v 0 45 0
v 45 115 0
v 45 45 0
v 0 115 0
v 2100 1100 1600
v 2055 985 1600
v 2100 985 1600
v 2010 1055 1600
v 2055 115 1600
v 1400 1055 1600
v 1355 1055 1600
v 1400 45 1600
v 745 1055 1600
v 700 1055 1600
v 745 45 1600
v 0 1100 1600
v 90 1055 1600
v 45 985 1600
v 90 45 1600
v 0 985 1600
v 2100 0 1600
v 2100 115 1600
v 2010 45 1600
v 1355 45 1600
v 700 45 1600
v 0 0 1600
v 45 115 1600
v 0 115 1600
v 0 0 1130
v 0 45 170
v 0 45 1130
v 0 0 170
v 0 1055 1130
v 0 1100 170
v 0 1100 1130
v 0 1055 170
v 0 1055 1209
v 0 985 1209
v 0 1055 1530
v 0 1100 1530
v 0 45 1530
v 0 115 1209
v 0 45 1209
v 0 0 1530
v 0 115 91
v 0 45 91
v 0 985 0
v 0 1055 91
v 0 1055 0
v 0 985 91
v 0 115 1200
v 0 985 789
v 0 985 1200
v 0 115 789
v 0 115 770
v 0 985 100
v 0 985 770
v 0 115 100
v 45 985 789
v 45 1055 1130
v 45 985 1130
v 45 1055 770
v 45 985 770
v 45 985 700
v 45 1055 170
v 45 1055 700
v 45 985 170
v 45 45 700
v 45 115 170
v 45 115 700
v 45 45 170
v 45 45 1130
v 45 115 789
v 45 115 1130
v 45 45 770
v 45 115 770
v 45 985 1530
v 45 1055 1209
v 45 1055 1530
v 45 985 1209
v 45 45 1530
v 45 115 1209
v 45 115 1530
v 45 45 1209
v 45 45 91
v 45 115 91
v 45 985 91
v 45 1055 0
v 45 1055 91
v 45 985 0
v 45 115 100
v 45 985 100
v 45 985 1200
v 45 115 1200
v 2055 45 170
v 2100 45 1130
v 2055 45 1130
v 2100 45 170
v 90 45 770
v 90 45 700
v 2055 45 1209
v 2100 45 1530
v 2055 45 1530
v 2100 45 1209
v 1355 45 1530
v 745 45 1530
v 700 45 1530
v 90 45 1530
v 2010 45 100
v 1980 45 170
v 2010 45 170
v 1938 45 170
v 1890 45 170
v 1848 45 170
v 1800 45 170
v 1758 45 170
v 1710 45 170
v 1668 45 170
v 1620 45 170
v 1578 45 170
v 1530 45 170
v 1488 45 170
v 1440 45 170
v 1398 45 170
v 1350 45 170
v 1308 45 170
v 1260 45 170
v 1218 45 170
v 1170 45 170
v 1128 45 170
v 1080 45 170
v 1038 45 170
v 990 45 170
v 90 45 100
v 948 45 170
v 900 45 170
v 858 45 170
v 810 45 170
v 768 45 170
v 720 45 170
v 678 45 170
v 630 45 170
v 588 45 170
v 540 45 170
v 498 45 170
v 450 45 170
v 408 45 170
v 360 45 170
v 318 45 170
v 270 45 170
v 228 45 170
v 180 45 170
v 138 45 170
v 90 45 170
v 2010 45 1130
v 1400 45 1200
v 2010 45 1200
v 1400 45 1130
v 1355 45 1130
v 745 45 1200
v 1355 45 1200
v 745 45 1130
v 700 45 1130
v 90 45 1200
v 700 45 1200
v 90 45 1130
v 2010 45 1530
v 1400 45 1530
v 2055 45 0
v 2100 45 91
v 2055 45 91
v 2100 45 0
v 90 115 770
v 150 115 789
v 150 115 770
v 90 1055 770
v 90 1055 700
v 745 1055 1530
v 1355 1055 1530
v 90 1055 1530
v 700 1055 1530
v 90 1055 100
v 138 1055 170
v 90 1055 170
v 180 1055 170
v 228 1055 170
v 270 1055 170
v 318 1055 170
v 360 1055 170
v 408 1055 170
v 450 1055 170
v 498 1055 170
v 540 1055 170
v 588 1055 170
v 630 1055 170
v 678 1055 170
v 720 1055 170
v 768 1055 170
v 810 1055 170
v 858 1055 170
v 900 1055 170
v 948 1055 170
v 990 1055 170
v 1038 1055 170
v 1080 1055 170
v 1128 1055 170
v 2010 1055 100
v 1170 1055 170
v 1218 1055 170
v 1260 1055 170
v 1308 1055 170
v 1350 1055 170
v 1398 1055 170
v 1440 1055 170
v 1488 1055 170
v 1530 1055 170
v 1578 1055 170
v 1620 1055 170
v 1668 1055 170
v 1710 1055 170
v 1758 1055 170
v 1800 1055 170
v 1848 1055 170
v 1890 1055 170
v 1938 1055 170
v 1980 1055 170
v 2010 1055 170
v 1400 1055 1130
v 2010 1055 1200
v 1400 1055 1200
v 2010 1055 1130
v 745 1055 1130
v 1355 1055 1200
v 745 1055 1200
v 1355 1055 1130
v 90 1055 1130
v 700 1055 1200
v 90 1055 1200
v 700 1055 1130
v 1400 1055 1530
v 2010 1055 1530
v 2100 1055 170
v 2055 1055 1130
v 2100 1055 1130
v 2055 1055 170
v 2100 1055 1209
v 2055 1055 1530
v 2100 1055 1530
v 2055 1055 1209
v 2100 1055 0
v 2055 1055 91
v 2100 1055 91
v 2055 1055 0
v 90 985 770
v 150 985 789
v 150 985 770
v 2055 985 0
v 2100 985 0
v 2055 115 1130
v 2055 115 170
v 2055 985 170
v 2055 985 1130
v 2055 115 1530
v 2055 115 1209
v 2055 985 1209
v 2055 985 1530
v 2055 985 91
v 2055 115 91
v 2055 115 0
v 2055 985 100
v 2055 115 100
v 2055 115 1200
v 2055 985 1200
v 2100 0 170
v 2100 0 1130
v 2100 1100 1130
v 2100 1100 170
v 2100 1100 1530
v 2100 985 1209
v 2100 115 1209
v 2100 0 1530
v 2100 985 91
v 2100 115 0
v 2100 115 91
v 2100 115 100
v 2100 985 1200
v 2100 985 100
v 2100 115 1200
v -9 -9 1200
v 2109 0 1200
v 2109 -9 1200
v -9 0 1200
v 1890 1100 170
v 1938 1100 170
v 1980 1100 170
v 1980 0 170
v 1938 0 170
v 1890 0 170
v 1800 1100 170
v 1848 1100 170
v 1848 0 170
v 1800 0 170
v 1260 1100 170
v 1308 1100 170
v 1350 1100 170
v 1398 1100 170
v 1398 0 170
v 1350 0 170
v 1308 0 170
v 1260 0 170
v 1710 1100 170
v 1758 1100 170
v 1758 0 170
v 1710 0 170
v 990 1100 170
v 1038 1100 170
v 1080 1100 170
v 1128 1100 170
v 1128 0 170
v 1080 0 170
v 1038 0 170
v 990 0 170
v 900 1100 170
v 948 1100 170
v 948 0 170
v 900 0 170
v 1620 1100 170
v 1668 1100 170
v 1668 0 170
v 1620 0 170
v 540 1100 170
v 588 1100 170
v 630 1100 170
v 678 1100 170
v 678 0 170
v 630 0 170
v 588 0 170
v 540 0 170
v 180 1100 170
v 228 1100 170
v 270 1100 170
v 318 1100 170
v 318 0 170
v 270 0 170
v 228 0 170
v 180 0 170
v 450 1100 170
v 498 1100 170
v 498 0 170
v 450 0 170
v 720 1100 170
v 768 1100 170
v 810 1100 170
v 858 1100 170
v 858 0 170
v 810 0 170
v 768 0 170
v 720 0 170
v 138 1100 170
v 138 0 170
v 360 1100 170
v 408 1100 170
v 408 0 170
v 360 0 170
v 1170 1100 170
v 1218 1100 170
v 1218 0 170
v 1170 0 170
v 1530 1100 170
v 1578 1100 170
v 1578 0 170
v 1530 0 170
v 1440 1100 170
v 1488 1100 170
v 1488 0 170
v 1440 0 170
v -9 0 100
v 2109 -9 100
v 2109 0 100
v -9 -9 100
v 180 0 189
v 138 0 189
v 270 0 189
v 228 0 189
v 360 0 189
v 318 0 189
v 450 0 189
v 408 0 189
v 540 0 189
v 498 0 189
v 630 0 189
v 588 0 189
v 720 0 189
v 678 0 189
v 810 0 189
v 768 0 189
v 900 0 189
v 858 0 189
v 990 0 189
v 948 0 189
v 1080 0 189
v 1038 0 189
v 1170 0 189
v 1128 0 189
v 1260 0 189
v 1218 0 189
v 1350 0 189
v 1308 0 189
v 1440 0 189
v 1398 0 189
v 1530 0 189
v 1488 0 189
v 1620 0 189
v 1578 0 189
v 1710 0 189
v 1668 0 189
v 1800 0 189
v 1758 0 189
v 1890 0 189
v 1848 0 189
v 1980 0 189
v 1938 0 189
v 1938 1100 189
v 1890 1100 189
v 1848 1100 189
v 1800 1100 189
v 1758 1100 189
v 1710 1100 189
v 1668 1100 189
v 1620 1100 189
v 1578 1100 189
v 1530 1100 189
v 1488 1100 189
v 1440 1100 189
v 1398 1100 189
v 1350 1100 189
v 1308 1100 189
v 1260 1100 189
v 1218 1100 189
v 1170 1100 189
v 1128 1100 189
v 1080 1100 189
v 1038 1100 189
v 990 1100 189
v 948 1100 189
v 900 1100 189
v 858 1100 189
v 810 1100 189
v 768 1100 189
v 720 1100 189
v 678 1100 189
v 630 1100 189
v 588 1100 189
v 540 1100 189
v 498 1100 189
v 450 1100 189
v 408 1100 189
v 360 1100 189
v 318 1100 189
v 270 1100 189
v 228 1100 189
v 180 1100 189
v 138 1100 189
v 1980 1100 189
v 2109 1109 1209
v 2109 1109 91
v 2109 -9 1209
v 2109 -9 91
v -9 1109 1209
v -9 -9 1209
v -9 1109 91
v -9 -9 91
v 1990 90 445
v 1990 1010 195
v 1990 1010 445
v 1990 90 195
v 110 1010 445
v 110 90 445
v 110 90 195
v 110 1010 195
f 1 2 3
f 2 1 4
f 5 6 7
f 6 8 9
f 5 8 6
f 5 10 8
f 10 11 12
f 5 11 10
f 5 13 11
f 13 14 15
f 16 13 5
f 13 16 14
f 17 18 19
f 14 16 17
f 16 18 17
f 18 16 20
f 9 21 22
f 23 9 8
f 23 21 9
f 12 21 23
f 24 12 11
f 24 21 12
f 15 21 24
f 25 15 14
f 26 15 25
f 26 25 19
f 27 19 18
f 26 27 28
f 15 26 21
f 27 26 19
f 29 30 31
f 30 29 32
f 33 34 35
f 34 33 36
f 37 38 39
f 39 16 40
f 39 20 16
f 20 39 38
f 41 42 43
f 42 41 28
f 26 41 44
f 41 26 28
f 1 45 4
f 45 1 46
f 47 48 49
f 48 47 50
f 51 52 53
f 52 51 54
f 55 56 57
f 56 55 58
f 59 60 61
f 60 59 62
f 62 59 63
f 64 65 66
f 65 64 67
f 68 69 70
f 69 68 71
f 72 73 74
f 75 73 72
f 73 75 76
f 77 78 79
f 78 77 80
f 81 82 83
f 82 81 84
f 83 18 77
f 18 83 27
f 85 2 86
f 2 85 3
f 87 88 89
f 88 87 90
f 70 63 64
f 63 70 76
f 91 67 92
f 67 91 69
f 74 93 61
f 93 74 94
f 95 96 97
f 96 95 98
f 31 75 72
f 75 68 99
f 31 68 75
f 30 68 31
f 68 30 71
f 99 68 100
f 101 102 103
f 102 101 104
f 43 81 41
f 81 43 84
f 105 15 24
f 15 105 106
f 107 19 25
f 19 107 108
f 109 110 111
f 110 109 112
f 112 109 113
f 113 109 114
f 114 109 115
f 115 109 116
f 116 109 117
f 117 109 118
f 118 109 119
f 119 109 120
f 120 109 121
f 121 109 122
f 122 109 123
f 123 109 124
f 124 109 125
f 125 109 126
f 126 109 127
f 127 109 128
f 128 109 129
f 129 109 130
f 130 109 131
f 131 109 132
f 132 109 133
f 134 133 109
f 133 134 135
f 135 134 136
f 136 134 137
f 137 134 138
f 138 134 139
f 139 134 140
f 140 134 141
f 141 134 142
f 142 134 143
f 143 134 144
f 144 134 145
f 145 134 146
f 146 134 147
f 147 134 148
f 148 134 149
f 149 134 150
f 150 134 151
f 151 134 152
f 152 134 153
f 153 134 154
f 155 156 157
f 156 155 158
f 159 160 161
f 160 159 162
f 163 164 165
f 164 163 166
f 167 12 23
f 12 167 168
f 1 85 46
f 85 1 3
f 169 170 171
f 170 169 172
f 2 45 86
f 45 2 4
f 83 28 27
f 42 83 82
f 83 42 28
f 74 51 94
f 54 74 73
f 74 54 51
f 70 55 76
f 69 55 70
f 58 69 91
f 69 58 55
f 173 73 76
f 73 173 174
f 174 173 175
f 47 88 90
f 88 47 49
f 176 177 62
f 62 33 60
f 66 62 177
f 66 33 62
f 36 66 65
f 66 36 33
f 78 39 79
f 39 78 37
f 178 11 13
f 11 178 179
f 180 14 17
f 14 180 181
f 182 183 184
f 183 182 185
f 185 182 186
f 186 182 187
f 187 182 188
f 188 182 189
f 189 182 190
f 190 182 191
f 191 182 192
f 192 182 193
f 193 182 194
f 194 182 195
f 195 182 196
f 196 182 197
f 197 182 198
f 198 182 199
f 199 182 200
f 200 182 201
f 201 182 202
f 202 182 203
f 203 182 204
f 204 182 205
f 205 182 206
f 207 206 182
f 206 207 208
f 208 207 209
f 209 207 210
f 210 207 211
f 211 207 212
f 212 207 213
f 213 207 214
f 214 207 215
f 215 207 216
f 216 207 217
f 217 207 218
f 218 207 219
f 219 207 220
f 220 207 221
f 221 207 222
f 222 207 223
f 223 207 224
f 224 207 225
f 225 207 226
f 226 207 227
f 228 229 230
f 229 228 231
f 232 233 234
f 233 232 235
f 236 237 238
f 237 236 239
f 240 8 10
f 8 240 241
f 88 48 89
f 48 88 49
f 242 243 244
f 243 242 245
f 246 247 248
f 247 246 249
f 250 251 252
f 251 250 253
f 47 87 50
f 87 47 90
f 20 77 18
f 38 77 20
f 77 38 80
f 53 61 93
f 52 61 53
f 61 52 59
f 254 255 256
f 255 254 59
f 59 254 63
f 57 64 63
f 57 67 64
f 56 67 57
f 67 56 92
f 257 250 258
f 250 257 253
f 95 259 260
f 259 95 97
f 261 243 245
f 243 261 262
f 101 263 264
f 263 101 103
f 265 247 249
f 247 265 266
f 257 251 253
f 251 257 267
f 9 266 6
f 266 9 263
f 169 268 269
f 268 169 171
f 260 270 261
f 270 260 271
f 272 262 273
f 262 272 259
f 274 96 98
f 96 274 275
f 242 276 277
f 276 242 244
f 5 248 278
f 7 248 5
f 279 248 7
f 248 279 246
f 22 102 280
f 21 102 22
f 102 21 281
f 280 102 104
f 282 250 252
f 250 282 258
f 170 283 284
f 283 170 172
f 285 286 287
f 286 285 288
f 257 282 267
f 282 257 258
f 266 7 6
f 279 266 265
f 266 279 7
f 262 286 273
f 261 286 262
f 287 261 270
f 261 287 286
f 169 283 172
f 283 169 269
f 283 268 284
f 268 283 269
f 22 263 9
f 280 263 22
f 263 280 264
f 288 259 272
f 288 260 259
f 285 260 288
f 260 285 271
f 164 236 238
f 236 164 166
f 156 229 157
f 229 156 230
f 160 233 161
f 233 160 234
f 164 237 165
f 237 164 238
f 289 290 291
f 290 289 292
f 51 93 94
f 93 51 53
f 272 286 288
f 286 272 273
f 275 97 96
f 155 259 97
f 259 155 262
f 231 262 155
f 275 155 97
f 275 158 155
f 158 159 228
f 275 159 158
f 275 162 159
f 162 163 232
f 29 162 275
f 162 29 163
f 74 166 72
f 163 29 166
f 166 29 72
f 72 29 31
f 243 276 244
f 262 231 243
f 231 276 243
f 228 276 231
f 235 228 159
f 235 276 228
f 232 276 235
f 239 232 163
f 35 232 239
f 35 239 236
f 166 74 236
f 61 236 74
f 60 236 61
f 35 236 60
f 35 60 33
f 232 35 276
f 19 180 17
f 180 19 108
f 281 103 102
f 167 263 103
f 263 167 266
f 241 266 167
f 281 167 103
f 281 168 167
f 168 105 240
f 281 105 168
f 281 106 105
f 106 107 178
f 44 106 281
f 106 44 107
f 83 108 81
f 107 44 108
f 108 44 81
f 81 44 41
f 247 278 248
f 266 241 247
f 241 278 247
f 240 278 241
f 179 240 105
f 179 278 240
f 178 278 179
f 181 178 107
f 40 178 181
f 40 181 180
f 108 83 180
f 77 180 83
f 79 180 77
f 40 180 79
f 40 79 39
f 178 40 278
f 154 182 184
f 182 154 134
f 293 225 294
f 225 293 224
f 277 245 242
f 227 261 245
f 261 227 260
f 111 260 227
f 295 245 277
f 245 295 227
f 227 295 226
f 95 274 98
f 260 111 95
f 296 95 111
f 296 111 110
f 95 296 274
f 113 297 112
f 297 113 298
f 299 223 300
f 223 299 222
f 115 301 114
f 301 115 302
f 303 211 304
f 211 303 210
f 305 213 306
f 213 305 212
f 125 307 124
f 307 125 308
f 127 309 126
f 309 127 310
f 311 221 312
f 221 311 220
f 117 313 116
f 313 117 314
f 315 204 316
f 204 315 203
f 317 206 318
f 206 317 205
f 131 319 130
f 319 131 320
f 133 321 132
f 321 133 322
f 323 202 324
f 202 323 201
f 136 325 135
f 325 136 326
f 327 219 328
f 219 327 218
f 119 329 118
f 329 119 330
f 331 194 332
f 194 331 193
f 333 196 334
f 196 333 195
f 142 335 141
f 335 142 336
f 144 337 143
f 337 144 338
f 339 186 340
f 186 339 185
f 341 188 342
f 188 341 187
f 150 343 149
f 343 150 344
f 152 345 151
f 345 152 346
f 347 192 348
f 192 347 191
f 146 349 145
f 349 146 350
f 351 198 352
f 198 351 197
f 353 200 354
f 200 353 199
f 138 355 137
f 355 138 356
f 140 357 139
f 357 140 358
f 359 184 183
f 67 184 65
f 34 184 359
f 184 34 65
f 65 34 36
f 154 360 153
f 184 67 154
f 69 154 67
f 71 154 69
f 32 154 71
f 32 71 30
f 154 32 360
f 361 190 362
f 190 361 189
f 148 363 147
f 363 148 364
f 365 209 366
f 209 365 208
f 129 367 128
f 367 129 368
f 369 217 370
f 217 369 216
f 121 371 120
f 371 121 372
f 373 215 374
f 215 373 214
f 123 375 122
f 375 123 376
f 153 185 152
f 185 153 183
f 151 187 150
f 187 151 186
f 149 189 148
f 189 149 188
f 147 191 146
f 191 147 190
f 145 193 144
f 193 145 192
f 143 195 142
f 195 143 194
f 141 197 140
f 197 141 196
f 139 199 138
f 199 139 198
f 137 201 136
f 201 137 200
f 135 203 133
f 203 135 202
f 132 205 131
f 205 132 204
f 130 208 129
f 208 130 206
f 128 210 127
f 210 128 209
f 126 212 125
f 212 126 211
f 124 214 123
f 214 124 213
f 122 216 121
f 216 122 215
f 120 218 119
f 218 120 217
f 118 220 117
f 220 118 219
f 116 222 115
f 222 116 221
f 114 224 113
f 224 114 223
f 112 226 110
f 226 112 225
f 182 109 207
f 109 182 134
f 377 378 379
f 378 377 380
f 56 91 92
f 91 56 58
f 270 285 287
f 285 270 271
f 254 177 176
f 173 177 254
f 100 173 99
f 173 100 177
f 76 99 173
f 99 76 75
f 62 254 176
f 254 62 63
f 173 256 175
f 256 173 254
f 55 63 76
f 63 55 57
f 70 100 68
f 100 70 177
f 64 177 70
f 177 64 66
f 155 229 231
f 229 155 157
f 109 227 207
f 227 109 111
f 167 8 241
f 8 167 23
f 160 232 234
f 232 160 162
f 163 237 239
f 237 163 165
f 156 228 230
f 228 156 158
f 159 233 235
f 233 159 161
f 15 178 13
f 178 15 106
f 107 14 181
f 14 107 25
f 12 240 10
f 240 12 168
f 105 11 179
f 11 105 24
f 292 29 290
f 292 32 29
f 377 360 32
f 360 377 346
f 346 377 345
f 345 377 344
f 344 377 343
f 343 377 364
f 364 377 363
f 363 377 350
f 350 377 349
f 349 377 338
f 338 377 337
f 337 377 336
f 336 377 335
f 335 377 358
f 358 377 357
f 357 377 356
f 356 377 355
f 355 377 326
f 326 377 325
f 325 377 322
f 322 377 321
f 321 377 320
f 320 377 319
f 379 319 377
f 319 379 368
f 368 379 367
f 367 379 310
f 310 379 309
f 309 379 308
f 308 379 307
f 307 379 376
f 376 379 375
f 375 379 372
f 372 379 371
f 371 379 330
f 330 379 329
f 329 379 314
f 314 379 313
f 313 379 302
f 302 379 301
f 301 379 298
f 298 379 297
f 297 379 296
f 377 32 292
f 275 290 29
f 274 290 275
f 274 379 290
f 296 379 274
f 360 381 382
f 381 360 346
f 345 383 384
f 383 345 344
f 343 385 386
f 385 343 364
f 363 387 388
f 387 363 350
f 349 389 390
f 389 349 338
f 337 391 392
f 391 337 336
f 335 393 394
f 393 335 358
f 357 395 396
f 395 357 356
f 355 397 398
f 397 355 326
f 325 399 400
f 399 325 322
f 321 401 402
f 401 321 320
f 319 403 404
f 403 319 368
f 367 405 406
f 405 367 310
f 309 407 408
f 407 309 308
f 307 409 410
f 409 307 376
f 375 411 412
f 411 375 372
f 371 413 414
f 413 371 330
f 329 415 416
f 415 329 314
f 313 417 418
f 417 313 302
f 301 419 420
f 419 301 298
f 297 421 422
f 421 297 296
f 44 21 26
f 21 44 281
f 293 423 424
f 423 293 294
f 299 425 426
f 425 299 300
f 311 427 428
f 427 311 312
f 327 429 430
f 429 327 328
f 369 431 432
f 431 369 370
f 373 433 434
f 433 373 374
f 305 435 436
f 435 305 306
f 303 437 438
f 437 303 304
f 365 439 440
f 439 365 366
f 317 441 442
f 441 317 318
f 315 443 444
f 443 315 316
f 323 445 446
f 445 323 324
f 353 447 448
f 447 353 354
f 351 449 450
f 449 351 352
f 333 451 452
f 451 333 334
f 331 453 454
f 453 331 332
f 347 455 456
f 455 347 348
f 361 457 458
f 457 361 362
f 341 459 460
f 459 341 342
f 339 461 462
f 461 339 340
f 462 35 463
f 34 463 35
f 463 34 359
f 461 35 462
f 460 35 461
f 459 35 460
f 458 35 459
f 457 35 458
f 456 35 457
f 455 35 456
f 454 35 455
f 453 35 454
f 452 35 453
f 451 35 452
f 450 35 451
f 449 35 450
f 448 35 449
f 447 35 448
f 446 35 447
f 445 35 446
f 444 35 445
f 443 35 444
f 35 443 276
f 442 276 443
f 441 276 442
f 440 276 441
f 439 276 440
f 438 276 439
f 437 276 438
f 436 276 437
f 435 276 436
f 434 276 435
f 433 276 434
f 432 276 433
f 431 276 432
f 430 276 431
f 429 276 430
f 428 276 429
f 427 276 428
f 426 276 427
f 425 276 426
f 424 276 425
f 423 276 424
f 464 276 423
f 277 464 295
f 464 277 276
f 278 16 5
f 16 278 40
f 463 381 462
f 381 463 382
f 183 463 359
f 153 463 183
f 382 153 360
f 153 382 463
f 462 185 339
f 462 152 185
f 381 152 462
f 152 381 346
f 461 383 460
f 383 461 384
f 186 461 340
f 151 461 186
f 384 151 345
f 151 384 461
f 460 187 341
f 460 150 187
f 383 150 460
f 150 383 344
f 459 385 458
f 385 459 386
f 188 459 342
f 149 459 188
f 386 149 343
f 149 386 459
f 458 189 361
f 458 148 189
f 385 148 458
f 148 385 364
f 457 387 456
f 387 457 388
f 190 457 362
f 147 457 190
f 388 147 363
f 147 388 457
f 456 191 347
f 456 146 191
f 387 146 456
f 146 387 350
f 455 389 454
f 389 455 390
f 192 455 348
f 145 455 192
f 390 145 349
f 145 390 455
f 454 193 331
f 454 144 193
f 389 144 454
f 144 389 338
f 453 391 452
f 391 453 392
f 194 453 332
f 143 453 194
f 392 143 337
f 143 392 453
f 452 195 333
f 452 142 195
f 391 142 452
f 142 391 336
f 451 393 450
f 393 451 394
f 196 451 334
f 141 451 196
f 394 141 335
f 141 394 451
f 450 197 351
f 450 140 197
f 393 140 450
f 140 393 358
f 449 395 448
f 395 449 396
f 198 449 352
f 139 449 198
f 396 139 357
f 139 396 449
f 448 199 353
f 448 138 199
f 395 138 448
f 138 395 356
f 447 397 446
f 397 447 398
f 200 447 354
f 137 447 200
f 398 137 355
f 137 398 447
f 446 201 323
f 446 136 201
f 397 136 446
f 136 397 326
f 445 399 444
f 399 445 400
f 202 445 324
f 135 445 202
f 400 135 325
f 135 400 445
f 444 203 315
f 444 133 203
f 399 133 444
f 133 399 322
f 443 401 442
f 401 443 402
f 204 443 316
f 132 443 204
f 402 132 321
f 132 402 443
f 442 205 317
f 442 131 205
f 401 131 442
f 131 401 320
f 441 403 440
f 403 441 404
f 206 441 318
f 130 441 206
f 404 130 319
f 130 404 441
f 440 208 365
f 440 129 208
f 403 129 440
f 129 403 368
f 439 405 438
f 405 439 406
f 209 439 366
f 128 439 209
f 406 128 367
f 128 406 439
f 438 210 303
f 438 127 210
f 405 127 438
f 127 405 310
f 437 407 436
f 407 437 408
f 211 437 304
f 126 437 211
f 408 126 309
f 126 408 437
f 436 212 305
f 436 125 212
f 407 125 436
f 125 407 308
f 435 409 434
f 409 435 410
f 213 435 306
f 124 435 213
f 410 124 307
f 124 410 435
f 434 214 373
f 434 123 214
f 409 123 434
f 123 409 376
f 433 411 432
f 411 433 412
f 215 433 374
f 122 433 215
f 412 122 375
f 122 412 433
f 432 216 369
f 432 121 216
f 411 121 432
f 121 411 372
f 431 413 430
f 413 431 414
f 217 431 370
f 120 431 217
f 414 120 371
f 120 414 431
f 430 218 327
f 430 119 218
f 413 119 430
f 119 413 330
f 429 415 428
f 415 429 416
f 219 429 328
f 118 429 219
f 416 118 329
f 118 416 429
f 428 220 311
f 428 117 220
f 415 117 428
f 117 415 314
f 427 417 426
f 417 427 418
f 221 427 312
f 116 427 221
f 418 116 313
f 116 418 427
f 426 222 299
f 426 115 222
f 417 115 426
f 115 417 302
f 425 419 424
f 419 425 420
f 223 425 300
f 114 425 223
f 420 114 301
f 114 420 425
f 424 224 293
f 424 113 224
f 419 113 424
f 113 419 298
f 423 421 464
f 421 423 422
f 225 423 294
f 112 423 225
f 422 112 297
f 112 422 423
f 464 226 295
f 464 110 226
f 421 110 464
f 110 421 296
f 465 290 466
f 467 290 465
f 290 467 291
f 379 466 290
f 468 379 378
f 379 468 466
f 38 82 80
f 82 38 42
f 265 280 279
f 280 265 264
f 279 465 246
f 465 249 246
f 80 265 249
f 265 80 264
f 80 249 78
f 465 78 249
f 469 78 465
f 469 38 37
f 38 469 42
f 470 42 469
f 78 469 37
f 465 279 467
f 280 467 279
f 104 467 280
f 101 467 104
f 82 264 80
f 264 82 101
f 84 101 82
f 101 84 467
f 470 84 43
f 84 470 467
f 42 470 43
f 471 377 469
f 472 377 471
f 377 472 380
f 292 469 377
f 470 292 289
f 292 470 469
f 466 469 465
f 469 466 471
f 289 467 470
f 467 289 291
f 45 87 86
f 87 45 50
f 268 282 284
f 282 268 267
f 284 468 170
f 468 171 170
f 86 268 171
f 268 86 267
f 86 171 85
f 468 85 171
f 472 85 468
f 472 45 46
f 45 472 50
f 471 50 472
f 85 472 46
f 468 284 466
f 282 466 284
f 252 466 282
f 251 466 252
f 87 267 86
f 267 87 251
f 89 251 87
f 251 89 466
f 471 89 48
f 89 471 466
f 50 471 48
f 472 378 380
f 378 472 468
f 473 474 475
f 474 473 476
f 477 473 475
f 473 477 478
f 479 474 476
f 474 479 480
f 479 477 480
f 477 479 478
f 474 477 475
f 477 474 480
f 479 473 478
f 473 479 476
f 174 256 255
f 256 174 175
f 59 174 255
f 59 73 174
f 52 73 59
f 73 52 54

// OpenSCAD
// Structural CD Plywood 2400 x 1200mm 9mm $37
// CustomWood MDF 2400 x 1200 x 9mm $24
// Porta 42 x 42mm 2.4m Standard and Better Pine DAR $15
// Porta 40 x 18mm 2.4m Clear Pine DAR Moulding $17

// 8 x 15 = 120
// 9 x 17 = 153
// 5 x 24 = 120
//        = 393


// 11 * 7 = 77
// 10 * 6 = 60
// 3 x 24 = 72
//        = 209 + 52


function mattress_vec(x, y, z) = [
	x + 2040,
	y + 1070,
	z + 250
];

function frame_vec(x, y, z) = [
	x + 2250,
	y + 1200,
	z + 1200
];

function frame_vec(x, y, z) = [
	x + 2100,
	y + 1100,
	z + 1200
];

function mattress_vec(x, y, z) = [
	x + 1880,
	y + 920,
	z + 250
];

function mattress_x() = mattress_vec(0, 0, 0)[0];
function mattress_y() = mattress_vec(0, 0, 0)[1];
function mattress_z() = mattress_vec(0, 0, 0)[2];

function frame_x() = frame_vec(0, 0, 0)[0];
function frame_y() = frame_vec(0, 0, 0)[1];
function frame_z1() = frame_vec(0, 0, 0)[2];
function frame_z2() = frame_z1() + 400;
function frame_base() = 100;
function frame_cladding() = 9;

function mattress_dvec(x, y, z) = [
	x + (frame_x() - mattress_x())/2,
	y + (frame_y() - mattress_y())/2,
	z + frame_base() + frame_sq() + 25,
];

function beam_vec(len) = [
	len,
	70,
	45
];

function beam_width(len) = beam_vec(1)[1];
function beam_thick(len) = beam_vec(1)[2];

function mattress_dvec(x, y, z) = [
	x + (frame_x() - mattress_x())/2,
	y + (frame_y() - mattress_y())/2,
	z + frame_base() + beam_width() + 25,
];

module mattress()
{
	translate(mattress_dvec(0, 0, 0)) color("ivory", 1)
		cube(mattress_vec(0, 0, 0));
}

module slat()
{
	translate([0, 0, 0]) rotate([0, 0, 90])
		cube([frame_y(), 42, 19]);
}

module leg()
{
	translate([beam_thick(), 0, 0]) rotate([0, -90, 0])
		cube(beam_vec(frame_z2()));
}

module ybeam()
{
	translate([0, 0, 0]) rotate([90, 0, 90])
		cube(beam_vec(frame_y() - beam_thick() - beam_thick()));
}

module xbeam()
{
	translate([0, beam_thick(), 0]) rotate([90, 0, 0])
		cube(beam_vec(frame_x()));
}

module surface()
{
	translate([0, 0, 0]) rotate([0, 0, 0])
		cube([frame_x() + frame_cladding() + frame_cladding(), frame_y() + frame_cladding() + frame_cladding(), frame_cladding()]);
}

module xside()
{
	translate([0, frame_cladding(), 0]) rotate([90, 0, 0])
		cube([frame_x() + frame_cladding() + frame_cladding(), frame_z1() - frame_base(), frame_cladding()]);
}

module yside()
{
	translate([0, 0, 0]) rotate([0, -90, 0])
		cube([frame_z1() - frame_base(), frame_y(), frame_cladding()]);
}

module legs()
{
	translate([
		0,
		beam_thick(),
		0
	])
	leg();

	translate([
		0,
		frame_y() - beam_width() - beam_thick(),
		0
	])
	leg();

	translate([
		frame_x() - beam_thick(), 
		frame_y() - beam_width() - beam_thick(), 
		0
	])
	leg();

	translate([
		frame_x() - beam_thick(), 
		beam_thick(), 
		0
	])
	leg();
}

module ybeam_head_z1()
{
	translate([
		beam_thick(), 
		beam_thick(),
		frame_z1() - beam_width(),
	])
	ybeam();
}

module ybeam_head_base()
{
	translate([
		beam_thick(), 
		beam_thick(),
		frame_base(),
	])
	ybeam();
}

module ybeam_head_z2()
{
	translate([
		beam_thick(), 
		beam_thick(),
		frame_z2() - beam_width(),
	])
	ybeam();
}

module ybeam_head_shelf()
{
	translate([
		beam_thick(), 
		beam_thick(),
		frame_base() + 600,
	])
	ybeam();
}

module ybeam_foot_z1()
{
	translate([
		frame_x() - beam_thick() - beam_thick(), 
		beam_thick(), 
		frame_z1() - beam_width(),
	])
	ybeam();
}

module ybeam_foot_base()
{
	translate([
		frame_x() - beam_thick() - beam_thick(), 
		beam_thick(), 
		frame_base(),
	])
	ybeam();
}

module ybeam_foot_z2()
{
	translate([
		frame_x() - beam_thick() - beam_thick(), 
		beam_thick(), 
		frame_z2() - beam_width(),
	])
	ybeam();
}

module ybeams()
{
	ybeam_head_z1();
	ybeam_head_z2();
	ybeam_head_base();
	ybeam_head_shelf();

	ybeam_foot_z1();
	ybeam_foot_base();
	ybeam_foot_z2();

	translate([
		frame_x()/3,
		beam_thick(),
		frame_z1() - beam_width(),
	])
	ybeam();

	translate([
		frame_x() - frame_x()/3 - beam_thick(),
		beam_thick(),
		frame_z1() - beam_width(),
	])
	ybeam();

	translate([
		frame_x()/3,
		beam_thick(),
		frame_z2() - beam_width(),
	])
	ybeam();

	translate([
		frame_x() - frame_x()/3 - beam_thick(),
		beam_thick(),
		frame_z2() - beam_width(),
	])
	ybeam();
}

module xbeams()
{
	translate([
		0,
		0,
		frame_z1() - beam_width(),
	])
	xbeam();

	translate([
		0,
		0,
		frame_base(),
	])
	xbeam();

	translate([
		0,
		0,
		frame_z2() - beam_width(),
	])
	xbeam();

	translate([
		0,
		frame_y() - beam_thick(),
		frame_z1() - beam_width(),
	])
	xbeam();

	translate([
		0,
		frame_y() - beam_thick(),
		frame_base(),
	])
	xbeam();

	translate([
		0,
		frame_y() - beam_thick(),
		frame_z2() - beam_width(),
	])
	xbeam();
}

module slats()
{
	for (i = [0:20])
		translate([
			beam_thick()*4 + i*beam_thick()*2,
			0,
			frame_base() + beam_width()
		])
		slat();
}

module cladding_z1()
{
	translate([
		-frame_cladding(),
		-frame_cladding(),
		frame_z1(),
	])
	surface();
}

module cladding_z2()
{
	translate([
		-frame_cladding(),
		-frame_cladding(),
		frame_z2(),
	])
	surface();
}

module cladding_base()
{
	translate([
		-frame_cladding(),
		-frame_cladding(),
		frame_base() - frame_cladding(),
	])
	surface();
}

module cladding_back()
{
	translate([
		-frame_cladding(),
		frame_y(),
		frame_base(),
	])
	xside();
}

module cladding_front()
{
	difference()
	{
		translate([
			-frame_cladding(),
			-frame_cladding(),
			frame_base(),
		])
		xside();

		translate([
			100,
			-500,
			frame_z1() - 950,
		])
		cube([frame_x() - 200, 1000, 800]);
	}
}

module cladding_head()
{
	translate([
		0,
		0,
		frame_base(),
	])
	yside();
}

module cladding_foot()
{
	translate([
		frame_x() + frame_cladding(),
		0,
		frame_base(),
	])
	yside();
}

module cladding()
{
	cladding_z1();
	//cladding_z2();
	cladding_base();
	cladding_back();
	//cladding_front();
	cladding_head();
	cladding_foot();
}

module shelf()
{
	translate([0, beam_width() + beam_thick(), frame_base() + 600 + beam_width()])
		cube([150, frame_y() - beam_width() - beam_width() - beam_thick() - beam_thick(), 19]);
}

module box()
{
	color("red")
		cube([350, 350, 250]);
}

module bed()
{
	mattress();

	color("brown", 1) legs();
	color("green", 1) ybeams();
	color("navy", 1) xbeams();
	color("orange", 1) slats();
	color("white", 1) cladding();

	shelf();
/*
	translate([beam_thick() + 20, 50, frame_z1() + frame_cladding()]) box();
	translate([beam_thick(), 450, frame_z1() + frame_cladding()]) box();
	translate([beam_thick() + 20 + 400, 50, frame_z1() + frame_cladding()]) box();
	translate([beam_thick() + 20 + 800, 50, frame_z1() + frame_cladding()]) box();
	translate([beam_thick() + 20 + 1200, 50, frame_z1() + frame_cladding()]) box();
	translate([beam_thick() + 20 + 1600, 50, frame_z1() + frame_cladding()]) box();
	translate([beam_thick() + 40 + 1600, 450, frame_z1() + frame_cladding()]) box();
*/
}

bed();
